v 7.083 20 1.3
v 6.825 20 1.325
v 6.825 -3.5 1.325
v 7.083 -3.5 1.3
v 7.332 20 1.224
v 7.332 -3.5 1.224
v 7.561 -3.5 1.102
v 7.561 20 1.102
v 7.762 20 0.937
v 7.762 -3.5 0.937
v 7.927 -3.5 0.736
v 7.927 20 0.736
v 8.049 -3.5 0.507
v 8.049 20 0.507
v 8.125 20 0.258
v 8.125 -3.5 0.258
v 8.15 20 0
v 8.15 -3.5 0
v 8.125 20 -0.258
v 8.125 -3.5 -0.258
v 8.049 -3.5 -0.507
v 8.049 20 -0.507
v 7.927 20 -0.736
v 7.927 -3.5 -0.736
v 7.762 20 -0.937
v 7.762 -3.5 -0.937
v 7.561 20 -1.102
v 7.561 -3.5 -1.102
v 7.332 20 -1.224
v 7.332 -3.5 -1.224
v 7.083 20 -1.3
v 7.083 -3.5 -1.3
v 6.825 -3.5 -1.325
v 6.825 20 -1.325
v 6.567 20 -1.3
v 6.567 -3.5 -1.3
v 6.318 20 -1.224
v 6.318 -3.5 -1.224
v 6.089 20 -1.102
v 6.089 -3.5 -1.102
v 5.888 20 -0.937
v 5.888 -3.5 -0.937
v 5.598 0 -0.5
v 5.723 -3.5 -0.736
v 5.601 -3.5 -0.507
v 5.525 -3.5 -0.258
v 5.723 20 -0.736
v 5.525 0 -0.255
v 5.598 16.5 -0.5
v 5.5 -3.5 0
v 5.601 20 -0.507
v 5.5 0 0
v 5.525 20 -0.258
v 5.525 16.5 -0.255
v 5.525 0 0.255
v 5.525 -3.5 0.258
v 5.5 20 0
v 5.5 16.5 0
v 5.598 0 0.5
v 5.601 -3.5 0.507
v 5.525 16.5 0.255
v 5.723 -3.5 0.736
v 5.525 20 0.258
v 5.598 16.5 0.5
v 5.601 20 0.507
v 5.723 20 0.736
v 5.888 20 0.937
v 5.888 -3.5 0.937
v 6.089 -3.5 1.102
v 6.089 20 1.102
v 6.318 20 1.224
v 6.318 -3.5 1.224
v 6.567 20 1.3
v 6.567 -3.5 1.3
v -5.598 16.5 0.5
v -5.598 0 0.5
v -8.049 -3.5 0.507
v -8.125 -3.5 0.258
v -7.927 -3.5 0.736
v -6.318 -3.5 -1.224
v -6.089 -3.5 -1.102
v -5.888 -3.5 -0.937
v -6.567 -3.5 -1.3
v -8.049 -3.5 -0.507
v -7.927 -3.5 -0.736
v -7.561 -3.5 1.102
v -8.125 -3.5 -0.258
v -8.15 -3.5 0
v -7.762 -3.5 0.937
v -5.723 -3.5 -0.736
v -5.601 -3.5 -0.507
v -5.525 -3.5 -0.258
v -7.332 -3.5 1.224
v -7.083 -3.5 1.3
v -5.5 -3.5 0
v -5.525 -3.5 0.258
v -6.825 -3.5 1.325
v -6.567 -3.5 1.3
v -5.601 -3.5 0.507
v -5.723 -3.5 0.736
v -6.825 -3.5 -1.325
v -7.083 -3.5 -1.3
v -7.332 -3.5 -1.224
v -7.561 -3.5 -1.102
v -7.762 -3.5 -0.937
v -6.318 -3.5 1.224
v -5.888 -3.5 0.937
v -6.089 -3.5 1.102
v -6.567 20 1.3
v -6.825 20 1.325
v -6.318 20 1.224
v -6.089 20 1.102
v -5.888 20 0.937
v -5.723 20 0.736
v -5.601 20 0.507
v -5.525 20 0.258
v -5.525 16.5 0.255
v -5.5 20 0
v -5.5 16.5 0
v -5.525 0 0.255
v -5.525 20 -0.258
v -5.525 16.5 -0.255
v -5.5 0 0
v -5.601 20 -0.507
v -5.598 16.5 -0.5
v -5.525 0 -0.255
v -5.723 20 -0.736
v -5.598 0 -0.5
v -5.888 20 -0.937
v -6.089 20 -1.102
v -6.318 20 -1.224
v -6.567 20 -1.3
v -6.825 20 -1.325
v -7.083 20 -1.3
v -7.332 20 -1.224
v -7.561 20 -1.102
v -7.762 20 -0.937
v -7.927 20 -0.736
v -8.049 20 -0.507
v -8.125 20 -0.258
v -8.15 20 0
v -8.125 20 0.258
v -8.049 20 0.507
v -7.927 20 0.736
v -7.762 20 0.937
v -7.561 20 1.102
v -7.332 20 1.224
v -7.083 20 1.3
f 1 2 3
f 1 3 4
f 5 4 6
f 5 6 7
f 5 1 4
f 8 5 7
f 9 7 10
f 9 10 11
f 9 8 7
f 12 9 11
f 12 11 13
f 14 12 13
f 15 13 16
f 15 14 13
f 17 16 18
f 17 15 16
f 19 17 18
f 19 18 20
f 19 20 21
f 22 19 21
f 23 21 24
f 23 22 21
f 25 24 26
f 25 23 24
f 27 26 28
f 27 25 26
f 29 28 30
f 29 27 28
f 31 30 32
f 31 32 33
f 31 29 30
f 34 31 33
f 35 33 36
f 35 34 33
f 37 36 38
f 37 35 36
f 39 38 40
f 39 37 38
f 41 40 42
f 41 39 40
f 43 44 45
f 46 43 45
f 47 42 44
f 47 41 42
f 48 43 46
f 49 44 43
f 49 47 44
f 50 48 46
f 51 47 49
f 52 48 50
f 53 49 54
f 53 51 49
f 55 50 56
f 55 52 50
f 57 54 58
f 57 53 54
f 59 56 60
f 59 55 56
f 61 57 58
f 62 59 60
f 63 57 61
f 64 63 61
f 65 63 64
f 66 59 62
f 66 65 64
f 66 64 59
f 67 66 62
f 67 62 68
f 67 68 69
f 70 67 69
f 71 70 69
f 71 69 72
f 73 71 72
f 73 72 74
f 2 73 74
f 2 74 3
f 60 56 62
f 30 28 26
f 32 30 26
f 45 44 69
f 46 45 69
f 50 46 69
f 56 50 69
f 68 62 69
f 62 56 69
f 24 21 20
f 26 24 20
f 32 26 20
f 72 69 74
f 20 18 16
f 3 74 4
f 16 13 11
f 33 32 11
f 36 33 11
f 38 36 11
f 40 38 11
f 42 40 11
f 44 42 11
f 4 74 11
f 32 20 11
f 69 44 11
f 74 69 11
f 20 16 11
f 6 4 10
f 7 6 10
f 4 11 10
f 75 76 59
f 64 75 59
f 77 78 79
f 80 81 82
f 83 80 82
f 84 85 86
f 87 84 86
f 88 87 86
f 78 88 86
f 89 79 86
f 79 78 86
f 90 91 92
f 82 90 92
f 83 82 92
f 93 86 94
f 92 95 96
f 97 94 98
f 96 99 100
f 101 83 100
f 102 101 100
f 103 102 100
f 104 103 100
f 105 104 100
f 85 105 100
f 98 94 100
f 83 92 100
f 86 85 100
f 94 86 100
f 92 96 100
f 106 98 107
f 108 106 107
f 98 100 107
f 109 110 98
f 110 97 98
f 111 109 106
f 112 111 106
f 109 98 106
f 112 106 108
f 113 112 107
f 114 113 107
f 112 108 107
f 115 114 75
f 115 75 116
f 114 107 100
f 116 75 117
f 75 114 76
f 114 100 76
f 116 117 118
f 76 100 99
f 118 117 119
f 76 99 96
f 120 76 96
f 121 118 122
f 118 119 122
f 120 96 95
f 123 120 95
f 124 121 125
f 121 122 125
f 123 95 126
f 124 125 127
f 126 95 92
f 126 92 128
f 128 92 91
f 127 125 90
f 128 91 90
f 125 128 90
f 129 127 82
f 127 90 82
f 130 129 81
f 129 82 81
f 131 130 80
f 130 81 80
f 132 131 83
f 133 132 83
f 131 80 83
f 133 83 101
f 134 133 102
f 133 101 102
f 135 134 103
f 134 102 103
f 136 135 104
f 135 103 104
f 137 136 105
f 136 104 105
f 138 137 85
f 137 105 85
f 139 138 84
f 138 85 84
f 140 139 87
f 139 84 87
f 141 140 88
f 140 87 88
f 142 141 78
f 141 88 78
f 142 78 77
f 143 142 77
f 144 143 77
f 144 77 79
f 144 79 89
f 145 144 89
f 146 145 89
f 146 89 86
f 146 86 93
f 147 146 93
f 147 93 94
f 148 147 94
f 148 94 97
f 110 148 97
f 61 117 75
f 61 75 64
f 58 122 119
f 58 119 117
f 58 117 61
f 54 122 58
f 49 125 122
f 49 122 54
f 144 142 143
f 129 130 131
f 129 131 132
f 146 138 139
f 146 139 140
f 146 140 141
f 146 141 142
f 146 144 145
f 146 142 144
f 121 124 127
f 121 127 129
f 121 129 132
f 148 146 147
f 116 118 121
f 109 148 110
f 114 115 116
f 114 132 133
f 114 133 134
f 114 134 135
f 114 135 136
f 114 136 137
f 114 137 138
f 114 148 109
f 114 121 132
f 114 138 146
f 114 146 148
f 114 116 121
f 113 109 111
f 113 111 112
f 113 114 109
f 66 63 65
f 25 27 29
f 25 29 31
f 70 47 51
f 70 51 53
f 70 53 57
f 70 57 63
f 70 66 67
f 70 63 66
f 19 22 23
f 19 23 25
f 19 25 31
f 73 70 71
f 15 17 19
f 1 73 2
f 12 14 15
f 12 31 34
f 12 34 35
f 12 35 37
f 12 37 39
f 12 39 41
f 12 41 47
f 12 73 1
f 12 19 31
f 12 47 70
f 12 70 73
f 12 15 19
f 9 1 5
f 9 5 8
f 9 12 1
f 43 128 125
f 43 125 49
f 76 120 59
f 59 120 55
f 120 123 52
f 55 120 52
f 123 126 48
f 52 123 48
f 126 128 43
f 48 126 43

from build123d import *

# Parameters (mm, degrees)
SKETCH1_W           = 13.65
SKETCH1_H           = 1
BOSS_EXTRUDE1_DEPTH = 16.5
SKETCH2_R           = 1.325
BOSS_EXTRUDE2_DEPTH = 11.75


with BuildPart() as part:
    # Sketch1 → Boss-Extrude1 (new body)
    with BuildSketch(Plane(origin=(0, 0, 0), x_dir=(1, 0, 0), z_dir=(0, 1, 0))):
        Rectangle(SKETCH1_W, SKETCH1_H)
    extrude(amount=BOSS_EXTRUDE1_DEPTH)

    # Sketch2 → Boss-Extrude2 (add, symmetric)
    with BuildSketch(Plane(origin=(0, 8.25, 0), x_dir=(1, 0, 0), z_dir=(0, 1, 0))):
        with Locations(Location((-6.825, 0, 0), (0, 0, 270))):
            Circle(SKETCH2_R)
        with Locations(Location((6.825, 0, 0), (0, 0, 270))):
            Circle(SKETCH2_R)
    extrude(amount=BOSS_EXTRUDE2_DEPTH, both=True)


solid = part.part
